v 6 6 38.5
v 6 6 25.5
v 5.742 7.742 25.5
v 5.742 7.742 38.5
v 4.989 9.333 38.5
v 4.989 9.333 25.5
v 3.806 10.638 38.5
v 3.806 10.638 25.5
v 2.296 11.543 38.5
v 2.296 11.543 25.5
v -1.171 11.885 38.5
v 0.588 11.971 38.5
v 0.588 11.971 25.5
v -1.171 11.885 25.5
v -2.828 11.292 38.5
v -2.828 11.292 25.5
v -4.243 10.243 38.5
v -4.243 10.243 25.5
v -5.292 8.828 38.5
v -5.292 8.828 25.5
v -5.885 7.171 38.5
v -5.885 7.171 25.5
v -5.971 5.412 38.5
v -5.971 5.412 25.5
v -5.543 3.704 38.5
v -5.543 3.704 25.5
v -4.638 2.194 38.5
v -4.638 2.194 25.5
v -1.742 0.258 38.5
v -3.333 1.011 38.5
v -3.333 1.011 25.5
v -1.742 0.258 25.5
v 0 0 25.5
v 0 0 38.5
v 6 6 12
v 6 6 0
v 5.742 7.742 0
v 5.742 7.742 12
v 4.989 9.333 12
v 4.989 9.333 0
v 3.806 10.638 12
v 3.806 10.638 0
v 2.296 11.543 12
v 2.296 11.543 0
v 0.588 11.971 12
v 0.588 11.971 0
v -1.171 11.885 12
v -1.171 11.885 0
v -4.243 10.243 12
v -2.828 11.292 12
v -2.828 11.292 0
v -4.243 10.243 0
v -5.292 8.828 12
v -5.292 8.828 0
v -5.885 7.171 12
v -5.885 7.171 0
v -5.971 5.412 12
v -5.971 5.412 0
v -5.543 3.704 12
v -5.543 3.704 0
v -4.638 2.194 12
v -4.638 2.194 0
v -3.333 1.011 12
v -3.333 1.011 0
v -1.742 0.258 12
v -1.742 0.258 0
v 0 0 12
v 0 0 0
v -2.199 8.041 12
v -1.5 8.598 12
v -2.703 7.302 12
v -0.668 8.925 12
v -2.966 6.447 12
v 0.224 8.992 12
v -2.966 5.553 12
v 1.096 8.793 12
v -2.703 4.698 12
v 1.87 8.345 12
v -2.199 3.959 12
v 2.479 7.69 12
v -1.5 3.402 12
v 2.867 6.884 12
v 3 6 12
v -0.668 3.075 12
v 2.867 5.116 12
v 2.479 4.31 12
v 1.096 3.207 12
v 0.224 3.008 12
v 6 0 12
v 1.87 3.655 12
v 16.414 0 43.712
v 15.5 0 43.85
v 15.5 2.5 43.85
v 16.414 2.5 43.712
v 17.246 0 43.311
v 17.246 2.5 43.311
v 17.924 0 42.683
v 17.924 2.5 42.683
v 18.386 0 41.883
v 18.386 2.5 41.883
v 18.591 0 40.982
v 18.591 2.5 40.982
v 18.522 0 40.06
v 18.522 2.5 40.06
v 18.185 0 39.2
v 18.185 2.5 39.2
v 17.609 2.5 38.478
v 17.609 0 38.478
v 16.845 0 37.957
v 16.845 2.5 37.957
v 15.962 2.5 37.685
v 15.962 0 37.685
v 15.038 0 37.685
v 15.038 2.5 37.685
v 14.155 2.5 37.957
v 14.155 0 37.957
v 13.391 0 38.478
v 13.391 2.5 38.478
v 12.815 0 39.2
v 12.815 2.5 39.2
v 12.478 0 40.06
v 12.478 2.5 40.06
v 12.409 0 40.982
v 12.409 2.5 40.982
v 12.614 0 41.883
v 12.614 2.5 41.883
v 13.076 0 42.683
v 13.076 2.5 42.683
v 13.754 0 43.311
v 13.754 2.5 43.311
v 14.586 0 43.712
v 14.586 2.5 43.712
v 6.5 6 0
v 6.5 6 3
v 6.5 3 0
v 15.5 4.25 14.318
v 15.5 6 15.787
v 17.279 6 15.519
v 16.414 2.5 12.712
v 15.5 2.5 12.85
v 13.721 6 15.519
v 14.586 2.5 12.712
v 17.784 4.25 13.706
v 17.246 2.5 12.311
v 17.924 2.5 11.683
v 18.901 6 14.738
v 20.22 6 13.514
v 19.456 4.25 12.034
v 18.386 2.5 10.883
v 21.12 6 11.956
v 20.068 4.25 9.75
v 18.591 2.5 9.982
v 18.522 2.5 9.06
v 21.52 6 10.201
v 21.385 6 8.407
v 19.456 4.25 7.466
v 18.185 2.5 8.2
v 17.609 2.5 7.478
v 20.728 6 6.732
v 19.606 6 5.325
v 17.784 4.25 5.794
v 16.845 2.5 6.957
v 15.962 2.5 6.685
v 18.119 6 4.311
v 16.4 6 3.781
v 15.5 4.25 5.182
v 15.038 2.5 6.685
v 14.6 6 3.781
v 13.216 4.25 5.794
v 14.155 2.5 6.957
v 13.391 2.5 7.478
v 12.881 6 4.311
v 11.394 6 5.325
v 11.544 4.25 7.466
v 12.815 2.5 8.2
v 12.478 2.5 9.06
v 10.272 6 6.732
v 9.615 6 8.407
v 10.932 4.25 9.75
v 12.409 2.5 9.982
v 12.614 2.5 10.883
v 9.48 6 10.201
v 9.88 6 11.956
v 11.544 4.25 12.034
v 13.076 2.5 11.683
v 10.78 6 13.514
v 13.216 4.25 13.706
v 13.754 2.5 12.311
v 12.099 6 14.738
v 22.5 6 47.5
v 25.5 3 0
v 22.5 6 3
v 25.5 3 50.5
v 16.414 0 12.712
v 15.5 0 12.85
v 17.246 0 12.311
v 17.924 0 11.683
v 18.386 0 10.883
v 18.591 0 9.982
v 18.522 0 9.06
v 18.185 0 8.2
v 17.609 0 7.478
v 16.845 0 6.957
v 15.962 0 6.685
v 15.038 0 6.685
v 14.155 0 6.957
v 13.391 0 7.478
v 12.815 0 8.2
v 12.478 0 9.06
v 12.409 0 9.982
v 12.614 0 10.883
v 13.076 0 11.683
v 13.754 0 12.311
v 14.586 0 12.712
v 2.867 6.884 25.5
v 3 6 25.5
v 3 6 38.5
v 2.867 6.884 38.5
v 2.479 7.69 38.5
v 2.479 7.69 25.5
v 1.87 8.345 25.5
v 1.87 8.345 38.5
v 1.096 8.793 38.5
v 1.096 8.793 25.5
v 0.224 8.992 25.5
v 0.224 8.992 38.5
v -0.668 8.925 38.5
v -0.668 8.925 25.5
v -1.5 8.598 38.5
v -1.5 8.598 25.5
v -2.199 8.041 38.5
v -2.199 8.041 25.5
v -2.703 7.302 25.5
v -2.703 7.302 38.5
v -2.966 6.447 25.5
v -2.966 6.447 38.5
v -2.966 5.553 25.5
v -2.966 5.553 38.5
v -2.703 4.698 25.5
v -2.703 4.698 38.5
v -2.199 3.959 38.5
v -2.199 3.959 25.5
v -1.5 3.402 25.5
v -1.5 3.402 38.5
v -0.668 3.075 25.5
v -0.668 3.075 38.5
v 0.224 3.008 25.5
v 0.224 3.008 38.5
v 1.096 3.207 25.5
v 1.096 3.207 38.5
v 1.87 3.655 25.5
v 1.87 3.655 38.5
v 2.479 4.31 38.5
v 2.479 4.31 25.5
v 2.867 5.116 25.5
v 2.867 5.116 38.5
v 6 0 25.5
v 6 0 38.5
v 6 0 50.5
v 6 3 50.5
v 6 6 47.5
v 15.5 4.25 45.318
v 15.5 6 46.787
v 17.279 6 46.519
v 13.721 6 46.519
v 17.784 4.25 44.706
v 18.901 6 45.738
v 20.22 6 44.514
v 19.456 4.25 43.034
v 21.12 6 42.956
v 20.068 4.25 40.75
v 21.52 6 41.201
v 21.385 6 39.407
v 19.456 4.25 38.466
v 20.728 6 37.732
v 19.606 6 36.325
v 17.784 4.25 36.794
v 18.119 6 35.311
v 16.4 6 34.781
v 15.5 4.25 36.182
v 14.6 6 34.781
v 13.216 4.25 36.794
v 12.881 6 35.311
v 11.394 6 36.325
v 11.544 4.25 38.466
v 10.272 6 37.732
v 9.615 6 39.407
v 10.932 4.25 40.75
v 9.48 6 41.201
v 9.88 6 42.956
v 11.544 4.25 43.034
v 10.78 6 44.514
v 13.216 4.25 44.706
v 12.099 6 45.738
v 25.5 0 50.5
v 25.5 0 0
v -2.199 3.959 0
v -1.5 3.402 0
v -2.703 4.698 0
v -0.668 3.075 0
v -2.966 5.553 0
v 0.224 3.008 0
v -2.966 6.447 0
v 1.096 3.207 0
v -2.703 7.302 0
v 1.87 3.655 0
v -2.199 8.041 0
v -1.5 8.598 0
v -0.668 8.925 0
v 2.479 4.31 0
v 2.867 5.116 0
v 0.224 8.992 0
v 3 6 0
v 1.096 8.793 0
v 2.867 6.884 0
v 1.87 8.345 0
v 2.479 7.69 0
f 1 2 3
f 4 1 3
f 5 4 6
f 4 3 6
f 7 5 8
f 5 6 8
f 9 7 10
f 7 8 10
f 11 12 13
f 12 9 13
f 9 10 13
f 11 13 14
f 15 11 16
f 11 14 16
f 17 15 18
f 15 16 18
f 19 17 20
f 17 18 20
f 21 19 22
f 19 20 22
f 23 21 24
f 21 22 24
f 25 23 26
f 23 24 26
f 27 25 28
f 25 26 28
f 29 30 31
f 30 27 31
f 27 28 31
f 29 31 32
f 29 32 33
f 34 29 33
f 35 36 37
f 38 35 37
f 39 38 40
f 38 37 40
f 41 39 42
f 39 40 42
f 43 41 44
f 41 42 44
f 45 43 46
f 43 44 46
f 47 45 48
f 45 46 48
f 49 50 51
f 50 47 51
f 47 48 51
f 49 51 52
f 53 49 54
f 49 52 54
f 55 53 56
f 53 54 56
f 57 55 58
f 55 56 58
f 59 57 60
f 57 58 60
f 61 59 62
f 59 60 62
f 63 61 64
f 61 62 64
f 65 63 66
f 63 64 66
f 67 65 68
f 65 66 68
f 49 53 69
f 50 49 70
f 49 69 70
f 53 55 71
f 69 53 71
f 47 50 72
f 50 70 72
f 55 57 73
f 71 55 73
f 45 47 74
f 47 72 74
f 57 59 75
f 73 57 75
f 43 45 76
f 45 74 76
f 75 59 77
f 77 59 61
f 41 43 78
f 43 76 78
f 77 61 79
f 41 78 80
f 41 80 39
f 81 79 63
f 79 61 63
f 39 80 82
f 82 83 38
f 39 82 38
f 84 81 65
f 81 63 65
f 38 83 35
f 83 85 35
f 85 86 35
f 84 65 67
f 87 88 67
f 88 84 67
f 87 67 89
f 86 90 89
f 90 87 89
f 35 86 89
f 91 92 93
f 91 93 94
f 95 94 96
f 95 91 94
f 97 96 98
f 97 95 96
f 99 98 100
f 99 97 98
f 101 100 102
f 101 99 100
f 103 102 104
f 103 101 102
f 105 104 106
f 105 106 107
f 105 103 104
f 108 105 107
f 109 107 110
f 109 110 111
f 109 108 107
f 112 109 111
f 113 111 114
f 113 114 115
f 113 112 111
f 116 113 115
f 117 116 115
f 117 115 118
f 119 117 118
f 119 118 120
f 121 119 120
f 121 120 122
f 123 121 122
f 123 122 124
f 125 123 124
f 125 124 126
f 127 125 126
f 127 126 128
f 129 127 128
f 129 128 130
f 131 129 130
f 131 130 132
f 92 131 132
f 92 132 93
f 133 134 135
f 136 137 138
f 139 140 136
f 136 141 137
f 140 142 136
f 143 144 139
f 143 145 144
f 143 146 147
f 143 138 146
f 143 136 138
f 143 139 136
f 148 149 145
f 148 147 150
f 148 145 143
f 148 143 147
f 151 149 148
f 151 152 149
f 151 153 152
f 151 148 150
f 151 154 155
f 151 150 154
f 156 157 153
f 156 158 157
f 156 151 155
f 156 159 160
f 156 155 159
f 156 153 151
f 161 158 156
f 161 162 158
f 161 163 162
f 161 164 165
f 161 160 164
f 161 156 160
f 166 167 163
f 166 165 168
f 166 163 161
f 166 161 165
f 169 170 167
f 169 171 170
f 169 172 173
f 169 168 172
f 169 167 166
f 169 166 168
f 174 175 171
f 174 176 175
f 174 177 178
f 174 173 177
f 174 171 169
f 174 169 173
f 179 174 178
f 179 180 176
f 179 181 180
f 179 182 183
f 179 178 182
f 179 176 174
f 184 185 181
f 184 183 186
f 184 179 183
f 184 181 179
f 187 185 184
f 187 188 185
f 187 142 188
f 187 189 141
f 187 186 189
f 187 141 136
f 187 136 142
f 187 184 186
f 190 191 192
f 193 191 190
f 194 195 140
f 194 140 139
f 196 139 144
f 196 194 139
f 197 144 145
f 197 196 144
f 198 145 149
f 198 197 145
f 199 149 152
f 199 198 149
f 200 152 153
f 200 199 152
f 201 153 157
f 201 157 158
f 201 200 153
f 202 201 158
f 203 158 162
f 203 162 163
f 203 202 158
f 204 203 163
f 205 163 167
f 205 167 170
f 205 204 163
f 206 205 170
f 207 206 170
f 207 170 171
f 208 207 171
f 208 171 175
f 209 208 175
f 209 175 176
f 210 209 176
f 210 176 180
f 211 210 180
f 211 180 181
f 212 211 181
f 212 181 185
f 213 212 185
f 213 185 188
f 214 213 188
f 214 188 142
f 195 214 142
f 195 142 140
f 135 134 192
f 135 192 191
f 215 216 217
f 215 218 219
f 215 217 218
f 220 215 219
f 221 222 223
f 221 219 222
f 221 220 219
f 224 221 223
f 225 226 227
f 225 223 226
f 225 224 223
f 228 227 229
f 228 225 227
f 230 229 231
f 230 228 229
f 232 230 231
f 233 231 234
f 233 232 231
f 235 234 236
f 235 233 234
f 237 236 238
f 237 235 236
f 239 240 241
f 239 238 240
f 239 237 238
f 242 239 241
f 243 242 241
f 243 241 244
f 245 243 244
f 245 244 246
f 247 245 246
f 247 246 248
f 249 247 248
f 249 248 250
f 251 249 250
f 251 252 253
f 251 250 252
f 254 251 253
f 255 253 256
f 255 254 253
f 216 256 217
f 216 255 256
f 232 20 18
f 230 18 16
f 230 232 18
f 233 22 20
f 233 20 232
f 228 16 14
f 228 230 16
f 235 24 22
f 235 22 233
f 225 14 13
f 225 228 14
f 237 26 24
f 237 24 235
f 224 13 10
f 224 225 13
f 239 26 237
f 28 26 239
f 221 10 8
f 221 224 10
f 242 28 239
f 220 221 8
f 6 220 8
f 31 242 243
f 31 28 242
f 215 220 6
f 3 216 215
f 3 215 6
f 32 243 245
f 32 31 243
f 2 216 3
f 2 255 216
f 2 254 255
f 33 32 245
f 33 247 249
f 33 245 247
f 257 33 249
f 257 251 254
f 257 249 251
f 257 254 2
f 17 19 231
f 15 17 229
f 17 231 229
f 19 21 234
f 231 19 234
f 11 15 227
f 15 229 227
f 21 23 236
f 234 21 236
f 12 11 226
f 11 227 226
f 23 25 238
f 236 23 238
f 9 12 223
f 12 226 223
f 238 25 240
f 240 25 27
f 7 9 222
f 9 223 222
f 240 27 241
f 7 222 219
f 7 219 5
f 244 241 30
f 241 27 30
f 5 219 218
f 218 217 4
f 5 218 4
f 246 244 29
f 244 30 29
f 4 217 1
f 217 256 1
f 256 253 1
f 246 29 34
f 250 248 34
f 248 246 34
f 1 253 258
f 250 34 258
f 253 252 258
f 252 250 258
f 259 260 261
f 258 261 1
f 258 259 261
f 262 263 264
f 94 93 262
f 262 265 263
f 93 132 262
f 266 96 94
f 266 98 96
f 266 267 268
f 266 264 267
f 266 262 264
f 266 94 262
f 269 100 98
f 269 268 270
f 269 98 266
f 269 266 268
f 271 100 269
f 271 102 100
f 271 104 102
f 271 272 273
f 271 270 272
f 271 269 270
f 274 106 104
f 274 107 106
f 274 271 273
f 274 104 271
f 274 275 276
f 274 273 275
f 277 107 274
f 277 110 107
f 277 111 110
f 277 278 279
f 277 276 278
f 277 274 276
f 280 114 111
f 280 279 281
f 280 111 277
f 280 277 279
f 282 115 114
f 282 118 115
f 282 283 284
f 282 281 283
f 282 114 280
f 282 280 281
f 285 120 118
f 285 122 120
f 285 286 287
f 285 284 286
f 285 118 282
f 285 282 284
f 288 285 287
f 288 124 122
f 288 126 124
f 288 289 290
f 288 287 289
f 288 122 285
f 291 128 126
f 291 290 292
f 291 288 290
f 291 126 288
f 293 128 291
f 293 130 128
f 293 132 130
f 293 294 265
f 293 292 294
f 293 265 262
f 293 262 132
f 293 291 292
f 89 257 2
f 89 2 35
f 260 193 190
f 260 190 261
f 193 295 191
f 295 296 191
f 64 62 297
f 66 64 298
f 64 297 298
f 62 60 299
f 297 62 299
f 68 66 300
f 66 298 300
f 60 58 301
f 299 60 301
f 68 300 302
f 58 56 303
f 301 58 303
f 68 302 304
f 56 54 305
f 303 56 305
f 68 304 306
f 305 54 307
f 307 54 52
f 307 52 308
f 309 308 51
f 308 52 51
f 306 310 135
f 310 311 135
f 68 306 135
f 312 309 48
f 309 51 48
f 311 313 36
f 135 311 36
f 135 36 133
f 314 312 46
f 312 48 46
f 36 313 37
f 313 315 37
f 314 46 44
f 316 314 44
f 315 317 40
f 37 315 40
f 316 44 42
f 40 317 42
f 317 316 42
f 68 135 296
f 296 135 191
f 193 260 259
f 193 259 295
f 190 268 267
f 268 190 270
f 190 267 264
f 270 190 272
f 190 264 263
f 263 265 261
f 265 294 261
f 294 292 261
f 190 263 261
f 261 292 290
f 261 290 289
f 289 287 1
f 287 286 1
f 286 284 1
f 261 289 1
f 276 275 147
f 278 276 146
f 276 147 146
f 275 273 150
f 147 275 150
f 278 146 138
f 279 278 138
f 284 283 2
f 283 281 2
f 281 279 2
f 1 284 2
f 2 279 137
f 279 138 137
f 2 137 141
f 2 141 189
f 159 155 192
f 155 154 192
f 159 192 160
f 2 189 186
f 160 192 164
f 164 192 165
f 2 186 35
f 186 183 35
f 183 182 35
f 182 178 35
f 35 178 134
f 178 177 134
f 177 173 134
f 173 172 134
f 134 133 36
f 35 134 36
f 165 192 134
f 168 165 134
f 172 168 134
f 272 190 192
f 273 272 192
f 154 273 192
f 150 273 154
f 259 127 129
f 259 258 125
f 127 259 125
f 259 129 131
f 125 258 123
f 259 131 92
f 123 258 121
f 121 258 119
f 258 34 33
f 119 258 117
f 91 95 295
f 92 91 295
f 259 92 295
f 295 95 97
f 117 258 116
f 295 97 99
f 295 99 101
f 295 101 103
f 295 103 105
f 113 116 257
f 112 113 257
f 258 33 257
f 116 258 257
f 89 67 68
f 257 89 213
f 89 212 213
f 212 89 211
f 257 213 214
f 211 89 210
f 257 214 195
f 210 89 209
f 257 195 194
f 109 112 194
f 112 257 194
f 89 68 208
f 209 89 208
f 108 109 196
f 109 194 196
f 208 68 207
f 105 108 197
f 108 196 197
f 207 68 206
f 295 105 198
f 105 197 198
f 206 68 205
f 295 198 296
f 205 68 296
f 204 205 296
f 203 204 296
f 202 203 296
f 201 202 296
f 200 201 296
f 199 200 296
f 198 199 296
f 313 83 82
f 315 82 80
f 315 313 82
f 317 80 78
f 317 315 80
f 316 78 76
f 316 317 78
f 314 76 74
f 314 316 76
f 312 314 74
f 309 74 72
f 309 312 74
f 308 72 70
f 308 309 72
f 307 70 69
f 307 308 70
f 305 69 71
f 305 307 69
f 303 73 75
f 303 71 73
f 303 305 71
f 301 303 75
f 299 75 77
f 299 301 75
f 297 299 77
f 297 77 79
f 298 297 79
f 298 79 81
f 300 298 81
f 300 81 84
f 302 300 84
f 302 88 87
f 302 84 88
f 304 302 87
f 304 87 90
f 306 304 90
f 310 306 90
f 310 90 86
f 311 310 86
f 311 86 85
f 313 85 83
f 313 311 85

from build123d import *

# Parameters (mm, degrees)
SKETCH_1_R                    = 3
EXTRUDE_1_DEPTH               = 50.5
CUT_EXTRUDE_2_DEPTH           = 50.5
CUT_EXTRUDE_2_DEPTH_BACK      = 58.831652233
SKETCH_3_R                    = 3.1
SKETCH_3_W                    = 28.166385617
SKETCH_3_H                    = 19.728727066
SKETCH_3_W_2                  = 28.6736781
SKETCH_3_H_2                  = 13.5
CUT_EXTRUDE_START             = 6.5
CUT_EXTRUDE_3_DEPTH           = 50.5
CHAMFER_1_SIZE                = 3
CUT_EXTRUDE_START_2           = 2.5
SKETCH_3_2_R                  = 3.1
CUT_EXTRUDE_5_DEPTH           = 10
CUT_EXTRUDE_5_DRAFT           = -40
CUT_EXTRUDE_5_PROFILE_2_DEPTH = 10
CUT_EXTRUDE_5_PROFILE_2_DRAFT = -40


with BuildPart() as part:
    # Эскиз1 → Бобышка-Вытянуть1 (new body)
    with BuildSketch(Plane.XY):
        with BuildLine():
            Line((0, 0), (25.5, 0))
            Line((25.5, 0), (25.5, 6))
            Line((25.5, 6), (6, 6))
            ThreePointArc((6, 6), (-4.242640687, 10.242640687), (0, 0))
        make_face()
        with Locations((0, 6)):
            Circle(SKETCH_1_R, mode=Mode.SUBTRACT)
    extrude(amount=EXTRUDE_1_DEPTH)

    # Эскиз3 → Вырез-Вытянуть2 (cut, two sides: drawn at the far end of the back side and taken through both)
    with BuildSketch(Plane(origin=(0, 0, 0), x_dir=(1, 0, 0), z_dir=(0, 1, 0)).offset(-CUT_EXTRUDE_2_DEPTH_BACK)):
        with Locations((15.5, -9.75)):
            Circle(SKETCH_3_R)
        with Locations((15.5, -40.75)):
            Circle(SKETCH_3_R)
        with Locations((-8.083192809, -48.364363533)):
            Rectangle(SKETCH_3_W, SKETCH_3_H)
        with Locations((-8.33683905, -18.75)):
            Rectangle(SKETCH_3_W_2, SKETCH_3_H_2)
    extrude(amount=CUT_EXTRUDE_2_DEPTH + CUT_EXTRUDE_2_DEPTH_BACK, mode=Mode.SUBTRACT)

    # Эскиз4 → Вырез-Вытянуть3 (cut)
    with BuildSketch(Plane(origin=(0, 0, 0), x_dir=(0, 0, -1), z_dir=(1, 0, 0)).offset(CUT_EXTRUDE_START)):
        Polygon((0, 6), (-3, 6), (0, 3), align=None)
    extrude(amount=CUT_EXTRUDE_3_DEPTH, mode=Mode.SUBTRACT)

    # Фаска1
    chamfer_1_edges = [part.edges().sort_by_distance(p)[0] for p in [
        (15.75, 6, 50.5),
        (25.5, 6, 26.75),
    ]]
    chamfer(chamfer_1_edges, length=CHAMFER_1_SIZE)


with BuildPart() as cut_extrude_5_tool:
    # Эскиз3<2> → Вырез-Вытянуть5 (with draft: the straight prism first)
    with BuildSketch(Plane(origin=(0, 0, 0), x_dir=(1, 0, 0), z_dir=(0, 1, 0)).offset(CUT_EXTRUDE_START_2)):
        with Locations((15.5, -9.75)):
            Circle(SKETCH_3_2_R)
    extrude(amount=CUT_EXTRUDE_5_DEPTH)
    # Вырез-Вытянуть5: the draft: its side faces are tilted about the plane it starts from
    cut_extrude_5_sides = [cut_extrude_5_tool.faces().sort_by_distance(p)[0] for p in [
        (12.4, 7.5, 9.75),
    ]]
    draft(cut_extrude_5_sides, Plane(origin=(0, 0, 0), x_dir=(1, 0, 0), z_dir=(0, 1, 0)).offset(CUT_EXTRUDE_START_2), CUT_EXTRUDE_5_DRAFT)


with BuildPart() as part_1:
    add(part.part)

    # Вырез-Вытянуть5: cut by cut_extrude_5_tool
    add(cut_extrude_5_tool.part, mode=Mode.SUBTRACT)


with BuildPart() as cut_extrude_5_profile_2_tool:
    # Эскиз3<2> → Вырез-Вытянуть5 profile 2 (with draft: the straight prism first)
    with BuildSketch(Plane(origin=(0, 0, 0), x_dir=(1, 0, 0), z_dir=(0, 1, 0)).offset(CUT_EXTRUDE_START_2)):
        with Locations((15.5, -40.75)):
            Circle(SKETCH_3_2_R)
    extrude(amount=CUT_EXTRUDE_5_PROFILE_2_DEPTH)
    # Вырез-Вытянуть5 profile 2: the draft: its side faces are tilted about the plane it starts from
    cut_extrude_5_profile_2_sides = [cut_extrude_5_profile_2_tool.faces().sort_by_distance(p)[0] for p in [
        (12.4, 7.5, 40.75),
    ]]
    draft(cut_extrude_5_profile_2_sides, Plane(origin=(0, 0, 0), x_dir=(1, 0, 0), z_dir=(0, 1, 0)).offset(CUT_EXTRUDE_START_2), CUT_EXTRUDE_5_PROFILE_2_DRAFT)


with BuildPart() as part_2:
    add(part_1.part)

    # Вырез-Вытянуть5 profile 2: cut by cut_extrude_5_profile_2_tool
    add(cut_extrude_5_profile_2_tool.part, mode=Mode.SUBTRACT)


solid = part_2.part
